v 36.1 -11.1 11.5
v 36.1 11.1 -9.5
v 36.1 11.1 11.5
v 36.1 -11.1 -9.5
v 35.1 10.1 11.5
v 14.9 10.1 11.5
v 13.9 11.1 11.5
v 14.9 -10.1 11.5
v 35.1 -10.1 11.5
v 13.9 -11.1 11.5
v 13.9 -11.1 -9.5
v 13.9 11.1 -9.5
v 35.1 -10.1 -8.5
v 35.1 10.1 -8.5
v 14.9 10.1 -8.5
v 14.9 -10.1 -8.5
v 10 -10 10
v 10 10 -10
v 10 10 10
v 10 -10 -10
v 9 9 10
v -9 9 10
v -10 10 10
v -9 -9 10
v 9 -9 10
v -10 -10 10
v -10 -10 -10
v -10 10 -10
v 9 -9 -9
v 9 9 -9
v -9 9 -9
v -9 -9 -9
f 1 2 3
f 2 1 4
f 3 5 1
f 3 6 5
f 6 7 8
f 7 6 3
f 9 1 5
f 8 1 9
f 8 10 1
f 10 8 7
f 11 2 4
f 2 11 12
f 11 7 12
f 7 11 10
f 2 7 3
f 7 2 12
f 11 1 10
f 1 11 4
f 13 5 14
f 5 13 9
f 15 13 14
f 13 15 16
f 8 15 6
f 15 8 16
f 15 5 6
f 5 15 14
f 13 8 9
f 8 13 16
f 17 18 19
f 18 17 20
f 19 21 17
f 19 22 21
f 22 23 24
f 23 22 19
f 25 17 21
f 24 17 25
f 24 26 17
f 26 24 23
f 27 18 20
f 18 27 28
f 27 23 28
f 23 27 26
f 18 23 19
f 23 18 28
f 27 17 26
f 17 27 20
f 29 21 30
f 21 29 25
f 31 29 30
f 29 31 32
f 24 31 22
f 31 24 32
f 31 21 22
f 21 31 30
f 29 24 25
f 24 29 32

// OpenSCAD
With_a_top = "yes";//[yes,no]
// in mm
width = 20;
// in mm
height = 20;
// in mm
depth = 20;
// in mm
wall_thickness = 1;
/* [advanced] */
Printer_accuracy = 0.2;
/* [Hidden] */
if (With_a_top == "yes") {
  union(){
    translate([(width + 5), 0, wall_thickness]){
      // Parametric box
      // change the numbers in the variable blocks to change the dimensions of the box and the wall thickness.
      difference() {
        cube([((width + wall_thickness * 2) + Printer_accuracy), ((depth + wall_thickness * 2) + Printer_accuracy), (height + wall_thickness * 1)], center=true);

        translate([0, 0, wall_thickness]){
          cube([(((width + wall_thickness * 2) + Printer_accuracy) - 2 * wall_thickness), (((depth + wall_thickness * 2) + Printer_accuracy) - 2 * wall_thickness), (height + wall_thickness)], center=true);
        }
      }
    }
    // Parametric box
    // change the numbers in the variable blocks to change the dimensions of the box and the wall thickness.
    difference() {
      cube([width, depth, height], center=true);

      translate([0, 0, wall_thickness]){
        cube([(width - 2 * wall_thickness), (depth - 2 * wall_thickness), height], center=true);
      }
    }
  }
} else {
  // Parametric box
  // change the numbers in the variable blocks to change the dimensions of the box and the wall thickness.
  difference() {
    cube([width, depth, height], center=true);

    translate([0, 0, wall_thickness]){
      cube([(width - 2 * wall_thickness), (depth - 2 * wall_thickness), height], center=true);
    }
  }
}
